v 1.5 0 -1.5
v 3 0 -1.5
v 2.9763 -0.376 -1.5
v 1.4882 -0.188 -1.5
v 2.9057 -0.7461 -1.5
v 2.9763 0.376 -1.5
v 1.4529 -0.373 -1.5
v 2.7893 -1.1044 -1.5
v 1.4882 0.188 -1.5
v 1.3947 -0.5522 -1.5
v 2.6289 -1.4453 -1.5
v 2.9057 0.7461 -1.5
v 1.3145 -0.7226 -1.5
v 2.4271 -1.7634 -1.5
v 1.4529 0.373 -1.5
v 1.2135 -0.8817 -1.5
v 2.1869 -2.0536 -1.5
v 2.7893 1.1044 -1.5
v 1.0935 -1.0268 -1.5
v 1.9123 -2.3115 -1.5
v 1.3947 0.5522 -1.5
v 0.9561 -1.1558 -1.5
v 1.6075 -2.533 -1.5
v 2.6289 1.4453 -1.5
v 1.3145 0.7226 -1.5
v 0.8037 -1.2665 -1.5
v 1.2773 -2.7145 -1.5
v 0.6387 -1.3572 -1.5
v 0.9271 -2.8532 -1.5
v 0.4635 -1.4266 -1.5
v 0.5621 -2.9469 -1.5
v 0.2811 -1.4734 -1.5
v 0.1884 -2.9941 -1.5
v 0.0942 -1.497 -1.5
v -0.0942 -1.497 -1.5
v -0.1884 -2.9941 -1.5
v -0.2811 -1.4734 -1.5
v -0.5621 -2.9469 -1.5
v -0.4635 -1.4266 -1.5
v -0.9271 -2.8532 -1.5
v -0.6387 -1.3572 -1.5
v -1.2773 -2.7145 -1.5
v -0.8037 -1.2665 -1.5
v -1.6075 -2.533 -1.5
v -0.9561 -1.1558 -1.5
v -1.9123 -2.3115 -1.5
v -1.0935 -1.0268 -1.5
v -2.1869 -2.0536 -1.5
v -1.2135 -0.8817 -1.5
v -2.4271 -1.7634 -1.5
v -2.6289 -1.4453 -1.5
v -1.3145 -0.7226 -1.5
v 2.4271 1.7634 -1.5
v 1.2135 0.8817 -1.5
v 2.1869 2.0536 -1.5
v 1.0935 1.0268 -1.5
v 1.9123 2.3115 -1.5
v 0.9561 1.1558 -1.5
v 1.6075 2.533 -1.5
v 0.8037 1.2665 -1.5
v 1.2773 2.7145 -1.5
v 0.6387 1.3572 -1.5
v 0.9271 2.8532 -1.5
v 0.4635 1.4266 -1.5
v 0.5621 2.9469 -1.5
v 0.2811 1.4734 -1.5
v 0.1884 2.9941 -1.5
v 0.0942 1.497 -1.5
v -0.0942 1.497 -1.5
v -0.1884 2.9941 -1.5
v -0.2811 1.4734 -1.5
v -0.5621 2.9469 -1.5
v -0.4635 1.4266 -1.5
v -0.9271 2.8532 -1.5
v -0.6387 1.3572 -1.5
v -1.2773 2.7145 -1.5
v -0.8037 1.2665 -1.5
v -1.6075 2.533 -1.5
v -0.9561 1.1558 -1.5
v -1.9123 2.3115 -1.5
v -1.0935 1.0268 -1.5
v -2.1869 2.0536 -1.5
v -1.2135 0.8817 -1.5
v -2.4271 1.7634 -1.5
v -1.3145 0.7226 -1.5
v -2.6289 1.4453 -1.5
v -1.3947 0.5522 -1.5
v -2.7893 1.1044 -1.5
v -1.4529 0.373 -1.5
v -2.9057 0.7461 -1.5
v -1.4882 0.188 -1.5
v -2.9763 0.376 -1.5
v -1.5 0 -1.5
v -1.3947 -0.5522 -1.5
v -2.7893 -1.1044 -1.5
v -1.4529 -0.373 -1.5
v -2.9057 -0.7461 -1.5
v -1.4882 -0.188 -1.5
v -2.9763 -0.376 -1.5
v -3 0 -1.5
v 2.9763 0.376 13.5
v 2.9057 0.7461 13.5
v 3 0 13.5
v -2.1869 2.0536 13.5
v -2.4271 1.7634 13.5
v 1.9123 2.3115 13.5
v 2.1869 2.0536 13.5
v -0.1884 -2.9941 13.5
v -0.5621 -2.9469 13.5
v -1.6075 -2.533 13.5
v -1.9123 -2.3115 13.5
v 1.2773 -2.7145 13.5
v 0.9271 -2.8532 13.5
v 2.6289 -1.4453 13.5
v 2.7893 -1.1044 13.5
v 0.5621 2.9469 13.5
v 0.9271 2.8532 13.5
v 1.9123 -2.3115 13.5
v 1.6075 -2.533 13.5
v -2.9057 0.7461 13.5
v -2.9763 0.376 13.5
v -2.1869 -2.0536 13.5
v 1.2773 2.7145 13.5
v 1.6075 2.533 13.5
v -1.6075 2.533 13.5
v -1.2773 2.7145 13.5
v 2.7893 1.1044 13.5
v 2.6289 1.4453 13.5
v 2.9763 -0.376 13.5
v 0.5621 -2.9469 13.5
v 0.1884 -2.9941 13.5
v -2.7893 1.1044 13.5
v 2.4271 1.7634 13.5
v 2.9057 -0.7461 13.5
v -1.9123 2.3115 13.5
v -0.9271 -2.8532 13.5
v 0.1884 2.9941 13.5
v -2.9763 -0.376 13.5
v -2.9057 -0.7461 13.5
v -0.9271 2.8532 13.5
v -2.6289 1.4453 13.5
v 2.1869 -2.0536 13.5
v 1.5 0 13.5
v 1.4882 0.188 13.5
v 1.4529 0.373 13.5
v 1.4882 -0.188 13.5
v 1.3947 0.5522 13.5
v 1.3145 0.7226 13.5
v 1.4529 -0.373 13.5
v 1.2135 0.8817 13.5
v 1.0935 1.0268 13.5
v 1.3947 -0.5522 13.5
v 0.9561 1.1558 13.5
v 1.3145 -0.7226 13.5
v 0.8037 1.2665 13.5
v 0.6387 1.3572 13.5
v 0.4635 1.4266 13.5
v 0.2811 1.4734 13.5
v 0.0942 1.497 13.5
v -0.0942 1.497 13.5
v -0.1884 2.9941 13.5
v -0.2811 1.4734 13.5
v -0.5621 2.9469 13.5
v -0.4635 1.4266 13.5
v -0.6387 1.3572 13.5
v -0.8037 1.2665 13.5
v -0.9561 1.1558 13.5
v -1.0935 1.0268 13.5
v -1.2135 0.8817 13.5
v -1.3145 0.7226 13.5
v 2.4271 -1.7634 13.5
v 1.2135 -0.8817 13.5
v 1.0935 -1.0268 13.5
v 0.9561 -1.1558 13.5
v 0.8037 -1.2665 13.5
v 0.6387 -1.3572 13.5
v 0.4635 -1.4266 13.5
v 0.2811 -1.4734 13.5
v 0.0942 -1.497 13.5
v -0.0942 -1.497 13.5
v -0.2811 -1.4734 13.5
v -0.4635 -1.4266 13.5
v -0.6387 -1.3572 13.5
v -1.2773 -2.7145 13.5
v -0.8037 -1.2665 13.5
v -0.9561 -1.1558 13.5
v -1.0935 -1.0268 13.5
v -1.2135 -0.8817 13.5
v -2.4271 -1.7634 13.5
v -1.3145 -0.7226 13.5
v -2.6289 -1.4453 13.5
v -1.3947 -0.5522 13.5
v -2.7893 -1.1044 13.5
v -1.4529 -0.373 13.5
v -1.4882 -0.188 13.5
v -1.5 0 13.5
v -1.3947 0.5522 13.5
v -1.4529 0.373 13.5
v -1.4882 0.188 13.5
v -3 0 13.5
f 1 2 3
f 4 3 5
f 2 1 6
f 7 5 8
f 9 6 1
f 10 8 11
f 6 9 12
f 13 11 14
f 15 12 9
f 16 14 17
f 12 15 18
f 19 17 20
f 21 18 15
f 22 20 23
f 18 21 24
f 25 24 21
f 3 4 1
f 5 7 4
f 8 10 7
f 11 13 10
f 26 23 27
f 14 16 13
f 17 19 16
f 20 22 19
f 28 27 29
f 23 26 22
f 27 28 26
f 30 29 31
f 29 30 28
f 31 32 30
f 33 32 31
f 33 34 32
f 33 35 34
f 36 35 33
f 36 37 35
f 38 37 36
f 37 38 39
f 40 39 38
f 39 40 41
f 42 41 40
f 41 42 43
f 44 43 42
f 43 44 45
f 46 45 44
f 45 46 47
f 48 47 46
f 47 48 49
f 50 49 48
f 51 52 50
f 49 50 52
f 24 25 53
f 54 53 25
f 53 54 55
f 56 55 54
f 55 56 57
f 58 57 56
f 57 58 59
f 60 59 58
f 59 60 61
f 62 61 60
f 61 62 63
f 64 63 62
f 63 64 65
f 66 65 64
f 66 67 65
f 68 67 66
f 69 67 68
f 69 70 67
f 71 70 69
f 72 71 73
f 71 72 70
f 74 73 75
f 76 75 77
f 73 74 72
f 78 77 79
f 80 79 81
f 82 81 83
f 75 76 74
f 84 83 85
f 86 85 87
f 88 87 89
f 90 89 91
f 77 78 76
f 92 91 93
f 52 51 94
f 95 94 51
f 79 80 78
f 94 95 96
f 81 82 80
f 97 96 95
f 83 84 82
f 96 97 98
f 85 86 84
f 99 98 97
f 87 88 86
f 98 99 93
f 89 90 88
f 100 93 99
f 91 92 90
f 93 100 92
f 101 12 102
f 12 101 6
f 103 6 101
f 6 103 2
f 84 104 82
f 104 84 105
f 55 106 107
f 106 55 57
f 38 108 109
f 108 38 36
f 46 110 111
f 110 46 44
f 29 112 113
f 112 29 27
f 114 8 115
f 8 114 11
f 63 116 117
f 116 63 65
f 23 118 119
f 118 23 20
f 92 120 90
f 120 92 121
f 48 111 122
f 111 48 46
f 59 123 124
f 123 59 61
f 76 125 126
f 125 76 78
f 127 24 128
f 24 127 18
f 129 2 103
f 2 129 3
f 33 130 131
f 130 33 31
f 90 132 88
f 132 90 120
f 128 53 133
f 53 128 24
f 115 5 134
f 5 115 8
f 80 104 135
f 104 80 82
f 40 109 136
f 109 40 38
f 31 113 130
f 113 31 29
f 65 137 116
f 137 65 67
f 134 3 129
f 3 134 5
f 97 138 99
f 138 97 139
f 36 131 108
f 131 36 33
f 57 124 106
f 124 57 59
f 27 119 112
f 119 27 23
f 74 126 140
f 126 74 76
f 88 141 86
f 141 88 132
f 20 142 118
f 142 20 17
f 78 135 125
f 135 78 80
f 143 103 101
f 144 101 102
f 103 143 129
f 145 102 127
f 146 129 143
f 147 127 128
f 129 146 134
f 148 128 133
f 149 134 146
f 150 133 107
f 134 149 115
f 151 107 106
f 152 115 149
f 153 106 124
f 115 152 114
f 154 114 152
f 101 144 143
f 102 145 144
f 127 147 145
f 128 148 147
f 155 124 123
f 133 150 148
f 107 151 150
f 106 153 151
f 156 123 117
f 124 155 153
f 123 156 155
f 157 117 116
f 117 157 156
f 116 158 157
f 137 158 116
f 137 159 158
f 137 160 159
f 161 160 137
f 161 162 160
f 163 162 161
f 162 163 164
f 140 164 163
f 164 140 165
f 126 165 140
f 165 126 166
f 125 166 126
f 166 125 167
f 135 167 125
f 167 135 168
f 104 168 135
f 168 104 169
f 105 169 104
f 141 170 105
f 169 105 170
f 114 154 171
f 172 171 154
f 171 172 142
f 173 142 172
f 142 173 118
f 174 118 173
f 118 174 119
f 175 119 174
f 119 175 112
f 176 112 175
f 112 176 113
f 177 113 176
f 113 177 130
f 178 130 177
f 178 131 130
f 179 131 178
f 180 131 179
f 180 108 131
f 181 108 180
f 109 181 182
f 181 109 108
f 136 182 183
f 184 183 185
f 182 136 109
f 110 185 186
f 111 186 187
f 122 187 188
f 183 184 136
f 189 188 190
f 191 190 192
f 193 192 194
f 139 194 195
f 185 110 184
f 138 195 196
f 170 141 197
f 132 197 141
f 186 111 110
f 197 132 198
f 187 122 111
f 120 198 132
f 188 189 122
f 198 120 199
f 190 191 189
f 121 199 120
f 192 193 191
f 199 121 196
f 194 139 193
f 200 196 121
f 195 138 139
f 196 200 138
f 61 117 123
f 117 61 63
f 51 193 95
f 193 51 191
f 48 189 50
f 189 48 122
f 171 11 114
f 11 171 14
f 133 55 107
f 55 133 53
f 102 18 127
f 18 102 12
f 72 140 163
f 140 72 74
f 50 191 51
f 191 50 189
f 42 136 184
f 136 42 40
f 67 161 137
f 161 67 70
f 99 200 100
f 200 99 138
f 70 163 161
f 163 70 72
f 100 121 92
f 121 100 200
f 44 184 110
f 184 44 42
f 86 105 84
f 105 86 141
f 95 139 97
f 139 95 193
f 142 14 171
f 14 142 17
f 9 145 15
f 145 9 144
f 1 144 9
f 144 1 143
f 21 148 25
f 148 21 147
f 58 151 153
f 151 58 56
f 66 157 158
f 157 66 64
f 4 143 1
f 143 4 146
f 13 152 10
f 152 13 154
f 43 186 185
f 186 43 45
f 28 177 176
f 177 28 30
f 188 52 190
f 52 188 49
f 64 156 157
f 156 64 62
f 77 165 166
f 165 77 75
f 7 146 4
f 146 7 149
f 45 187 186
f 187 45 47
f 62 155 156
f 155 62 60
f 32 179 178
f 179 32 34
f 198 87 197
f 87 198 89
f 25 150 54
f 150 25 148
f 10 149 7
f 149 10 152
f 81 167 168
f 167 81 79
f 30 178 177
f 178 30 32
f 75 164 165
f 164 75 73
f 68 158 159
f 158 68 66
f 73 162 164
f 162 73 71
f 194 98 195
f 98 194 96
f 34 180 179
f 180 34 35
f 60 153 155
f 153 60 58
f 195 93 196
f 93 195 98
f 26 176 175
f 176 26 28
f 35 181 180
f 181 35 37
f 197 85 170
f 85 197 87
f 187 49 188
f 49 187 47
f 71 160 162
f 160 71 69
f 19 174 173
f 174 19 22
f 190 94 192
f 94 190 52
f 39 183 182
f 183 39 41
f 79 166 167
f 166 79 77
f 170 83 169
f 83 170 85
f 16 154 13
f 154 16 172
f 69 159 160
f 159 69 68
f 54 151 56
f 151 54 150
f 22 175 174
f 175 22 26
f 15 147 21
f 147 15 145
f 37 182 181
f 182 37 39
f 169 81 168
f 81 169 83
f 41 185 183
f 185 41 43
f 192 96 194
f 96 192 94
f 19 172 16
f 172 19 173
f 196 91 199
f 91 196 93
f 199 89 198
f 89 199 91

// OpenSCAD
$fn = 50;


difference() {
	union() {
		translate(v = [0, 0, -1.5000000000]) {
			cylinder(h = 3, r = 1.0000000000);
		}
		translate(v = [0, 0, -1.5000000000]) {
			cylinder(h = 15, r = 3.0000000000);
		}
	}
	union() {
		translate(v = [0, 0, -100.0000000000]) {
			cylinder(h = 200, r = 1.5000000000);
		}
	}
}
